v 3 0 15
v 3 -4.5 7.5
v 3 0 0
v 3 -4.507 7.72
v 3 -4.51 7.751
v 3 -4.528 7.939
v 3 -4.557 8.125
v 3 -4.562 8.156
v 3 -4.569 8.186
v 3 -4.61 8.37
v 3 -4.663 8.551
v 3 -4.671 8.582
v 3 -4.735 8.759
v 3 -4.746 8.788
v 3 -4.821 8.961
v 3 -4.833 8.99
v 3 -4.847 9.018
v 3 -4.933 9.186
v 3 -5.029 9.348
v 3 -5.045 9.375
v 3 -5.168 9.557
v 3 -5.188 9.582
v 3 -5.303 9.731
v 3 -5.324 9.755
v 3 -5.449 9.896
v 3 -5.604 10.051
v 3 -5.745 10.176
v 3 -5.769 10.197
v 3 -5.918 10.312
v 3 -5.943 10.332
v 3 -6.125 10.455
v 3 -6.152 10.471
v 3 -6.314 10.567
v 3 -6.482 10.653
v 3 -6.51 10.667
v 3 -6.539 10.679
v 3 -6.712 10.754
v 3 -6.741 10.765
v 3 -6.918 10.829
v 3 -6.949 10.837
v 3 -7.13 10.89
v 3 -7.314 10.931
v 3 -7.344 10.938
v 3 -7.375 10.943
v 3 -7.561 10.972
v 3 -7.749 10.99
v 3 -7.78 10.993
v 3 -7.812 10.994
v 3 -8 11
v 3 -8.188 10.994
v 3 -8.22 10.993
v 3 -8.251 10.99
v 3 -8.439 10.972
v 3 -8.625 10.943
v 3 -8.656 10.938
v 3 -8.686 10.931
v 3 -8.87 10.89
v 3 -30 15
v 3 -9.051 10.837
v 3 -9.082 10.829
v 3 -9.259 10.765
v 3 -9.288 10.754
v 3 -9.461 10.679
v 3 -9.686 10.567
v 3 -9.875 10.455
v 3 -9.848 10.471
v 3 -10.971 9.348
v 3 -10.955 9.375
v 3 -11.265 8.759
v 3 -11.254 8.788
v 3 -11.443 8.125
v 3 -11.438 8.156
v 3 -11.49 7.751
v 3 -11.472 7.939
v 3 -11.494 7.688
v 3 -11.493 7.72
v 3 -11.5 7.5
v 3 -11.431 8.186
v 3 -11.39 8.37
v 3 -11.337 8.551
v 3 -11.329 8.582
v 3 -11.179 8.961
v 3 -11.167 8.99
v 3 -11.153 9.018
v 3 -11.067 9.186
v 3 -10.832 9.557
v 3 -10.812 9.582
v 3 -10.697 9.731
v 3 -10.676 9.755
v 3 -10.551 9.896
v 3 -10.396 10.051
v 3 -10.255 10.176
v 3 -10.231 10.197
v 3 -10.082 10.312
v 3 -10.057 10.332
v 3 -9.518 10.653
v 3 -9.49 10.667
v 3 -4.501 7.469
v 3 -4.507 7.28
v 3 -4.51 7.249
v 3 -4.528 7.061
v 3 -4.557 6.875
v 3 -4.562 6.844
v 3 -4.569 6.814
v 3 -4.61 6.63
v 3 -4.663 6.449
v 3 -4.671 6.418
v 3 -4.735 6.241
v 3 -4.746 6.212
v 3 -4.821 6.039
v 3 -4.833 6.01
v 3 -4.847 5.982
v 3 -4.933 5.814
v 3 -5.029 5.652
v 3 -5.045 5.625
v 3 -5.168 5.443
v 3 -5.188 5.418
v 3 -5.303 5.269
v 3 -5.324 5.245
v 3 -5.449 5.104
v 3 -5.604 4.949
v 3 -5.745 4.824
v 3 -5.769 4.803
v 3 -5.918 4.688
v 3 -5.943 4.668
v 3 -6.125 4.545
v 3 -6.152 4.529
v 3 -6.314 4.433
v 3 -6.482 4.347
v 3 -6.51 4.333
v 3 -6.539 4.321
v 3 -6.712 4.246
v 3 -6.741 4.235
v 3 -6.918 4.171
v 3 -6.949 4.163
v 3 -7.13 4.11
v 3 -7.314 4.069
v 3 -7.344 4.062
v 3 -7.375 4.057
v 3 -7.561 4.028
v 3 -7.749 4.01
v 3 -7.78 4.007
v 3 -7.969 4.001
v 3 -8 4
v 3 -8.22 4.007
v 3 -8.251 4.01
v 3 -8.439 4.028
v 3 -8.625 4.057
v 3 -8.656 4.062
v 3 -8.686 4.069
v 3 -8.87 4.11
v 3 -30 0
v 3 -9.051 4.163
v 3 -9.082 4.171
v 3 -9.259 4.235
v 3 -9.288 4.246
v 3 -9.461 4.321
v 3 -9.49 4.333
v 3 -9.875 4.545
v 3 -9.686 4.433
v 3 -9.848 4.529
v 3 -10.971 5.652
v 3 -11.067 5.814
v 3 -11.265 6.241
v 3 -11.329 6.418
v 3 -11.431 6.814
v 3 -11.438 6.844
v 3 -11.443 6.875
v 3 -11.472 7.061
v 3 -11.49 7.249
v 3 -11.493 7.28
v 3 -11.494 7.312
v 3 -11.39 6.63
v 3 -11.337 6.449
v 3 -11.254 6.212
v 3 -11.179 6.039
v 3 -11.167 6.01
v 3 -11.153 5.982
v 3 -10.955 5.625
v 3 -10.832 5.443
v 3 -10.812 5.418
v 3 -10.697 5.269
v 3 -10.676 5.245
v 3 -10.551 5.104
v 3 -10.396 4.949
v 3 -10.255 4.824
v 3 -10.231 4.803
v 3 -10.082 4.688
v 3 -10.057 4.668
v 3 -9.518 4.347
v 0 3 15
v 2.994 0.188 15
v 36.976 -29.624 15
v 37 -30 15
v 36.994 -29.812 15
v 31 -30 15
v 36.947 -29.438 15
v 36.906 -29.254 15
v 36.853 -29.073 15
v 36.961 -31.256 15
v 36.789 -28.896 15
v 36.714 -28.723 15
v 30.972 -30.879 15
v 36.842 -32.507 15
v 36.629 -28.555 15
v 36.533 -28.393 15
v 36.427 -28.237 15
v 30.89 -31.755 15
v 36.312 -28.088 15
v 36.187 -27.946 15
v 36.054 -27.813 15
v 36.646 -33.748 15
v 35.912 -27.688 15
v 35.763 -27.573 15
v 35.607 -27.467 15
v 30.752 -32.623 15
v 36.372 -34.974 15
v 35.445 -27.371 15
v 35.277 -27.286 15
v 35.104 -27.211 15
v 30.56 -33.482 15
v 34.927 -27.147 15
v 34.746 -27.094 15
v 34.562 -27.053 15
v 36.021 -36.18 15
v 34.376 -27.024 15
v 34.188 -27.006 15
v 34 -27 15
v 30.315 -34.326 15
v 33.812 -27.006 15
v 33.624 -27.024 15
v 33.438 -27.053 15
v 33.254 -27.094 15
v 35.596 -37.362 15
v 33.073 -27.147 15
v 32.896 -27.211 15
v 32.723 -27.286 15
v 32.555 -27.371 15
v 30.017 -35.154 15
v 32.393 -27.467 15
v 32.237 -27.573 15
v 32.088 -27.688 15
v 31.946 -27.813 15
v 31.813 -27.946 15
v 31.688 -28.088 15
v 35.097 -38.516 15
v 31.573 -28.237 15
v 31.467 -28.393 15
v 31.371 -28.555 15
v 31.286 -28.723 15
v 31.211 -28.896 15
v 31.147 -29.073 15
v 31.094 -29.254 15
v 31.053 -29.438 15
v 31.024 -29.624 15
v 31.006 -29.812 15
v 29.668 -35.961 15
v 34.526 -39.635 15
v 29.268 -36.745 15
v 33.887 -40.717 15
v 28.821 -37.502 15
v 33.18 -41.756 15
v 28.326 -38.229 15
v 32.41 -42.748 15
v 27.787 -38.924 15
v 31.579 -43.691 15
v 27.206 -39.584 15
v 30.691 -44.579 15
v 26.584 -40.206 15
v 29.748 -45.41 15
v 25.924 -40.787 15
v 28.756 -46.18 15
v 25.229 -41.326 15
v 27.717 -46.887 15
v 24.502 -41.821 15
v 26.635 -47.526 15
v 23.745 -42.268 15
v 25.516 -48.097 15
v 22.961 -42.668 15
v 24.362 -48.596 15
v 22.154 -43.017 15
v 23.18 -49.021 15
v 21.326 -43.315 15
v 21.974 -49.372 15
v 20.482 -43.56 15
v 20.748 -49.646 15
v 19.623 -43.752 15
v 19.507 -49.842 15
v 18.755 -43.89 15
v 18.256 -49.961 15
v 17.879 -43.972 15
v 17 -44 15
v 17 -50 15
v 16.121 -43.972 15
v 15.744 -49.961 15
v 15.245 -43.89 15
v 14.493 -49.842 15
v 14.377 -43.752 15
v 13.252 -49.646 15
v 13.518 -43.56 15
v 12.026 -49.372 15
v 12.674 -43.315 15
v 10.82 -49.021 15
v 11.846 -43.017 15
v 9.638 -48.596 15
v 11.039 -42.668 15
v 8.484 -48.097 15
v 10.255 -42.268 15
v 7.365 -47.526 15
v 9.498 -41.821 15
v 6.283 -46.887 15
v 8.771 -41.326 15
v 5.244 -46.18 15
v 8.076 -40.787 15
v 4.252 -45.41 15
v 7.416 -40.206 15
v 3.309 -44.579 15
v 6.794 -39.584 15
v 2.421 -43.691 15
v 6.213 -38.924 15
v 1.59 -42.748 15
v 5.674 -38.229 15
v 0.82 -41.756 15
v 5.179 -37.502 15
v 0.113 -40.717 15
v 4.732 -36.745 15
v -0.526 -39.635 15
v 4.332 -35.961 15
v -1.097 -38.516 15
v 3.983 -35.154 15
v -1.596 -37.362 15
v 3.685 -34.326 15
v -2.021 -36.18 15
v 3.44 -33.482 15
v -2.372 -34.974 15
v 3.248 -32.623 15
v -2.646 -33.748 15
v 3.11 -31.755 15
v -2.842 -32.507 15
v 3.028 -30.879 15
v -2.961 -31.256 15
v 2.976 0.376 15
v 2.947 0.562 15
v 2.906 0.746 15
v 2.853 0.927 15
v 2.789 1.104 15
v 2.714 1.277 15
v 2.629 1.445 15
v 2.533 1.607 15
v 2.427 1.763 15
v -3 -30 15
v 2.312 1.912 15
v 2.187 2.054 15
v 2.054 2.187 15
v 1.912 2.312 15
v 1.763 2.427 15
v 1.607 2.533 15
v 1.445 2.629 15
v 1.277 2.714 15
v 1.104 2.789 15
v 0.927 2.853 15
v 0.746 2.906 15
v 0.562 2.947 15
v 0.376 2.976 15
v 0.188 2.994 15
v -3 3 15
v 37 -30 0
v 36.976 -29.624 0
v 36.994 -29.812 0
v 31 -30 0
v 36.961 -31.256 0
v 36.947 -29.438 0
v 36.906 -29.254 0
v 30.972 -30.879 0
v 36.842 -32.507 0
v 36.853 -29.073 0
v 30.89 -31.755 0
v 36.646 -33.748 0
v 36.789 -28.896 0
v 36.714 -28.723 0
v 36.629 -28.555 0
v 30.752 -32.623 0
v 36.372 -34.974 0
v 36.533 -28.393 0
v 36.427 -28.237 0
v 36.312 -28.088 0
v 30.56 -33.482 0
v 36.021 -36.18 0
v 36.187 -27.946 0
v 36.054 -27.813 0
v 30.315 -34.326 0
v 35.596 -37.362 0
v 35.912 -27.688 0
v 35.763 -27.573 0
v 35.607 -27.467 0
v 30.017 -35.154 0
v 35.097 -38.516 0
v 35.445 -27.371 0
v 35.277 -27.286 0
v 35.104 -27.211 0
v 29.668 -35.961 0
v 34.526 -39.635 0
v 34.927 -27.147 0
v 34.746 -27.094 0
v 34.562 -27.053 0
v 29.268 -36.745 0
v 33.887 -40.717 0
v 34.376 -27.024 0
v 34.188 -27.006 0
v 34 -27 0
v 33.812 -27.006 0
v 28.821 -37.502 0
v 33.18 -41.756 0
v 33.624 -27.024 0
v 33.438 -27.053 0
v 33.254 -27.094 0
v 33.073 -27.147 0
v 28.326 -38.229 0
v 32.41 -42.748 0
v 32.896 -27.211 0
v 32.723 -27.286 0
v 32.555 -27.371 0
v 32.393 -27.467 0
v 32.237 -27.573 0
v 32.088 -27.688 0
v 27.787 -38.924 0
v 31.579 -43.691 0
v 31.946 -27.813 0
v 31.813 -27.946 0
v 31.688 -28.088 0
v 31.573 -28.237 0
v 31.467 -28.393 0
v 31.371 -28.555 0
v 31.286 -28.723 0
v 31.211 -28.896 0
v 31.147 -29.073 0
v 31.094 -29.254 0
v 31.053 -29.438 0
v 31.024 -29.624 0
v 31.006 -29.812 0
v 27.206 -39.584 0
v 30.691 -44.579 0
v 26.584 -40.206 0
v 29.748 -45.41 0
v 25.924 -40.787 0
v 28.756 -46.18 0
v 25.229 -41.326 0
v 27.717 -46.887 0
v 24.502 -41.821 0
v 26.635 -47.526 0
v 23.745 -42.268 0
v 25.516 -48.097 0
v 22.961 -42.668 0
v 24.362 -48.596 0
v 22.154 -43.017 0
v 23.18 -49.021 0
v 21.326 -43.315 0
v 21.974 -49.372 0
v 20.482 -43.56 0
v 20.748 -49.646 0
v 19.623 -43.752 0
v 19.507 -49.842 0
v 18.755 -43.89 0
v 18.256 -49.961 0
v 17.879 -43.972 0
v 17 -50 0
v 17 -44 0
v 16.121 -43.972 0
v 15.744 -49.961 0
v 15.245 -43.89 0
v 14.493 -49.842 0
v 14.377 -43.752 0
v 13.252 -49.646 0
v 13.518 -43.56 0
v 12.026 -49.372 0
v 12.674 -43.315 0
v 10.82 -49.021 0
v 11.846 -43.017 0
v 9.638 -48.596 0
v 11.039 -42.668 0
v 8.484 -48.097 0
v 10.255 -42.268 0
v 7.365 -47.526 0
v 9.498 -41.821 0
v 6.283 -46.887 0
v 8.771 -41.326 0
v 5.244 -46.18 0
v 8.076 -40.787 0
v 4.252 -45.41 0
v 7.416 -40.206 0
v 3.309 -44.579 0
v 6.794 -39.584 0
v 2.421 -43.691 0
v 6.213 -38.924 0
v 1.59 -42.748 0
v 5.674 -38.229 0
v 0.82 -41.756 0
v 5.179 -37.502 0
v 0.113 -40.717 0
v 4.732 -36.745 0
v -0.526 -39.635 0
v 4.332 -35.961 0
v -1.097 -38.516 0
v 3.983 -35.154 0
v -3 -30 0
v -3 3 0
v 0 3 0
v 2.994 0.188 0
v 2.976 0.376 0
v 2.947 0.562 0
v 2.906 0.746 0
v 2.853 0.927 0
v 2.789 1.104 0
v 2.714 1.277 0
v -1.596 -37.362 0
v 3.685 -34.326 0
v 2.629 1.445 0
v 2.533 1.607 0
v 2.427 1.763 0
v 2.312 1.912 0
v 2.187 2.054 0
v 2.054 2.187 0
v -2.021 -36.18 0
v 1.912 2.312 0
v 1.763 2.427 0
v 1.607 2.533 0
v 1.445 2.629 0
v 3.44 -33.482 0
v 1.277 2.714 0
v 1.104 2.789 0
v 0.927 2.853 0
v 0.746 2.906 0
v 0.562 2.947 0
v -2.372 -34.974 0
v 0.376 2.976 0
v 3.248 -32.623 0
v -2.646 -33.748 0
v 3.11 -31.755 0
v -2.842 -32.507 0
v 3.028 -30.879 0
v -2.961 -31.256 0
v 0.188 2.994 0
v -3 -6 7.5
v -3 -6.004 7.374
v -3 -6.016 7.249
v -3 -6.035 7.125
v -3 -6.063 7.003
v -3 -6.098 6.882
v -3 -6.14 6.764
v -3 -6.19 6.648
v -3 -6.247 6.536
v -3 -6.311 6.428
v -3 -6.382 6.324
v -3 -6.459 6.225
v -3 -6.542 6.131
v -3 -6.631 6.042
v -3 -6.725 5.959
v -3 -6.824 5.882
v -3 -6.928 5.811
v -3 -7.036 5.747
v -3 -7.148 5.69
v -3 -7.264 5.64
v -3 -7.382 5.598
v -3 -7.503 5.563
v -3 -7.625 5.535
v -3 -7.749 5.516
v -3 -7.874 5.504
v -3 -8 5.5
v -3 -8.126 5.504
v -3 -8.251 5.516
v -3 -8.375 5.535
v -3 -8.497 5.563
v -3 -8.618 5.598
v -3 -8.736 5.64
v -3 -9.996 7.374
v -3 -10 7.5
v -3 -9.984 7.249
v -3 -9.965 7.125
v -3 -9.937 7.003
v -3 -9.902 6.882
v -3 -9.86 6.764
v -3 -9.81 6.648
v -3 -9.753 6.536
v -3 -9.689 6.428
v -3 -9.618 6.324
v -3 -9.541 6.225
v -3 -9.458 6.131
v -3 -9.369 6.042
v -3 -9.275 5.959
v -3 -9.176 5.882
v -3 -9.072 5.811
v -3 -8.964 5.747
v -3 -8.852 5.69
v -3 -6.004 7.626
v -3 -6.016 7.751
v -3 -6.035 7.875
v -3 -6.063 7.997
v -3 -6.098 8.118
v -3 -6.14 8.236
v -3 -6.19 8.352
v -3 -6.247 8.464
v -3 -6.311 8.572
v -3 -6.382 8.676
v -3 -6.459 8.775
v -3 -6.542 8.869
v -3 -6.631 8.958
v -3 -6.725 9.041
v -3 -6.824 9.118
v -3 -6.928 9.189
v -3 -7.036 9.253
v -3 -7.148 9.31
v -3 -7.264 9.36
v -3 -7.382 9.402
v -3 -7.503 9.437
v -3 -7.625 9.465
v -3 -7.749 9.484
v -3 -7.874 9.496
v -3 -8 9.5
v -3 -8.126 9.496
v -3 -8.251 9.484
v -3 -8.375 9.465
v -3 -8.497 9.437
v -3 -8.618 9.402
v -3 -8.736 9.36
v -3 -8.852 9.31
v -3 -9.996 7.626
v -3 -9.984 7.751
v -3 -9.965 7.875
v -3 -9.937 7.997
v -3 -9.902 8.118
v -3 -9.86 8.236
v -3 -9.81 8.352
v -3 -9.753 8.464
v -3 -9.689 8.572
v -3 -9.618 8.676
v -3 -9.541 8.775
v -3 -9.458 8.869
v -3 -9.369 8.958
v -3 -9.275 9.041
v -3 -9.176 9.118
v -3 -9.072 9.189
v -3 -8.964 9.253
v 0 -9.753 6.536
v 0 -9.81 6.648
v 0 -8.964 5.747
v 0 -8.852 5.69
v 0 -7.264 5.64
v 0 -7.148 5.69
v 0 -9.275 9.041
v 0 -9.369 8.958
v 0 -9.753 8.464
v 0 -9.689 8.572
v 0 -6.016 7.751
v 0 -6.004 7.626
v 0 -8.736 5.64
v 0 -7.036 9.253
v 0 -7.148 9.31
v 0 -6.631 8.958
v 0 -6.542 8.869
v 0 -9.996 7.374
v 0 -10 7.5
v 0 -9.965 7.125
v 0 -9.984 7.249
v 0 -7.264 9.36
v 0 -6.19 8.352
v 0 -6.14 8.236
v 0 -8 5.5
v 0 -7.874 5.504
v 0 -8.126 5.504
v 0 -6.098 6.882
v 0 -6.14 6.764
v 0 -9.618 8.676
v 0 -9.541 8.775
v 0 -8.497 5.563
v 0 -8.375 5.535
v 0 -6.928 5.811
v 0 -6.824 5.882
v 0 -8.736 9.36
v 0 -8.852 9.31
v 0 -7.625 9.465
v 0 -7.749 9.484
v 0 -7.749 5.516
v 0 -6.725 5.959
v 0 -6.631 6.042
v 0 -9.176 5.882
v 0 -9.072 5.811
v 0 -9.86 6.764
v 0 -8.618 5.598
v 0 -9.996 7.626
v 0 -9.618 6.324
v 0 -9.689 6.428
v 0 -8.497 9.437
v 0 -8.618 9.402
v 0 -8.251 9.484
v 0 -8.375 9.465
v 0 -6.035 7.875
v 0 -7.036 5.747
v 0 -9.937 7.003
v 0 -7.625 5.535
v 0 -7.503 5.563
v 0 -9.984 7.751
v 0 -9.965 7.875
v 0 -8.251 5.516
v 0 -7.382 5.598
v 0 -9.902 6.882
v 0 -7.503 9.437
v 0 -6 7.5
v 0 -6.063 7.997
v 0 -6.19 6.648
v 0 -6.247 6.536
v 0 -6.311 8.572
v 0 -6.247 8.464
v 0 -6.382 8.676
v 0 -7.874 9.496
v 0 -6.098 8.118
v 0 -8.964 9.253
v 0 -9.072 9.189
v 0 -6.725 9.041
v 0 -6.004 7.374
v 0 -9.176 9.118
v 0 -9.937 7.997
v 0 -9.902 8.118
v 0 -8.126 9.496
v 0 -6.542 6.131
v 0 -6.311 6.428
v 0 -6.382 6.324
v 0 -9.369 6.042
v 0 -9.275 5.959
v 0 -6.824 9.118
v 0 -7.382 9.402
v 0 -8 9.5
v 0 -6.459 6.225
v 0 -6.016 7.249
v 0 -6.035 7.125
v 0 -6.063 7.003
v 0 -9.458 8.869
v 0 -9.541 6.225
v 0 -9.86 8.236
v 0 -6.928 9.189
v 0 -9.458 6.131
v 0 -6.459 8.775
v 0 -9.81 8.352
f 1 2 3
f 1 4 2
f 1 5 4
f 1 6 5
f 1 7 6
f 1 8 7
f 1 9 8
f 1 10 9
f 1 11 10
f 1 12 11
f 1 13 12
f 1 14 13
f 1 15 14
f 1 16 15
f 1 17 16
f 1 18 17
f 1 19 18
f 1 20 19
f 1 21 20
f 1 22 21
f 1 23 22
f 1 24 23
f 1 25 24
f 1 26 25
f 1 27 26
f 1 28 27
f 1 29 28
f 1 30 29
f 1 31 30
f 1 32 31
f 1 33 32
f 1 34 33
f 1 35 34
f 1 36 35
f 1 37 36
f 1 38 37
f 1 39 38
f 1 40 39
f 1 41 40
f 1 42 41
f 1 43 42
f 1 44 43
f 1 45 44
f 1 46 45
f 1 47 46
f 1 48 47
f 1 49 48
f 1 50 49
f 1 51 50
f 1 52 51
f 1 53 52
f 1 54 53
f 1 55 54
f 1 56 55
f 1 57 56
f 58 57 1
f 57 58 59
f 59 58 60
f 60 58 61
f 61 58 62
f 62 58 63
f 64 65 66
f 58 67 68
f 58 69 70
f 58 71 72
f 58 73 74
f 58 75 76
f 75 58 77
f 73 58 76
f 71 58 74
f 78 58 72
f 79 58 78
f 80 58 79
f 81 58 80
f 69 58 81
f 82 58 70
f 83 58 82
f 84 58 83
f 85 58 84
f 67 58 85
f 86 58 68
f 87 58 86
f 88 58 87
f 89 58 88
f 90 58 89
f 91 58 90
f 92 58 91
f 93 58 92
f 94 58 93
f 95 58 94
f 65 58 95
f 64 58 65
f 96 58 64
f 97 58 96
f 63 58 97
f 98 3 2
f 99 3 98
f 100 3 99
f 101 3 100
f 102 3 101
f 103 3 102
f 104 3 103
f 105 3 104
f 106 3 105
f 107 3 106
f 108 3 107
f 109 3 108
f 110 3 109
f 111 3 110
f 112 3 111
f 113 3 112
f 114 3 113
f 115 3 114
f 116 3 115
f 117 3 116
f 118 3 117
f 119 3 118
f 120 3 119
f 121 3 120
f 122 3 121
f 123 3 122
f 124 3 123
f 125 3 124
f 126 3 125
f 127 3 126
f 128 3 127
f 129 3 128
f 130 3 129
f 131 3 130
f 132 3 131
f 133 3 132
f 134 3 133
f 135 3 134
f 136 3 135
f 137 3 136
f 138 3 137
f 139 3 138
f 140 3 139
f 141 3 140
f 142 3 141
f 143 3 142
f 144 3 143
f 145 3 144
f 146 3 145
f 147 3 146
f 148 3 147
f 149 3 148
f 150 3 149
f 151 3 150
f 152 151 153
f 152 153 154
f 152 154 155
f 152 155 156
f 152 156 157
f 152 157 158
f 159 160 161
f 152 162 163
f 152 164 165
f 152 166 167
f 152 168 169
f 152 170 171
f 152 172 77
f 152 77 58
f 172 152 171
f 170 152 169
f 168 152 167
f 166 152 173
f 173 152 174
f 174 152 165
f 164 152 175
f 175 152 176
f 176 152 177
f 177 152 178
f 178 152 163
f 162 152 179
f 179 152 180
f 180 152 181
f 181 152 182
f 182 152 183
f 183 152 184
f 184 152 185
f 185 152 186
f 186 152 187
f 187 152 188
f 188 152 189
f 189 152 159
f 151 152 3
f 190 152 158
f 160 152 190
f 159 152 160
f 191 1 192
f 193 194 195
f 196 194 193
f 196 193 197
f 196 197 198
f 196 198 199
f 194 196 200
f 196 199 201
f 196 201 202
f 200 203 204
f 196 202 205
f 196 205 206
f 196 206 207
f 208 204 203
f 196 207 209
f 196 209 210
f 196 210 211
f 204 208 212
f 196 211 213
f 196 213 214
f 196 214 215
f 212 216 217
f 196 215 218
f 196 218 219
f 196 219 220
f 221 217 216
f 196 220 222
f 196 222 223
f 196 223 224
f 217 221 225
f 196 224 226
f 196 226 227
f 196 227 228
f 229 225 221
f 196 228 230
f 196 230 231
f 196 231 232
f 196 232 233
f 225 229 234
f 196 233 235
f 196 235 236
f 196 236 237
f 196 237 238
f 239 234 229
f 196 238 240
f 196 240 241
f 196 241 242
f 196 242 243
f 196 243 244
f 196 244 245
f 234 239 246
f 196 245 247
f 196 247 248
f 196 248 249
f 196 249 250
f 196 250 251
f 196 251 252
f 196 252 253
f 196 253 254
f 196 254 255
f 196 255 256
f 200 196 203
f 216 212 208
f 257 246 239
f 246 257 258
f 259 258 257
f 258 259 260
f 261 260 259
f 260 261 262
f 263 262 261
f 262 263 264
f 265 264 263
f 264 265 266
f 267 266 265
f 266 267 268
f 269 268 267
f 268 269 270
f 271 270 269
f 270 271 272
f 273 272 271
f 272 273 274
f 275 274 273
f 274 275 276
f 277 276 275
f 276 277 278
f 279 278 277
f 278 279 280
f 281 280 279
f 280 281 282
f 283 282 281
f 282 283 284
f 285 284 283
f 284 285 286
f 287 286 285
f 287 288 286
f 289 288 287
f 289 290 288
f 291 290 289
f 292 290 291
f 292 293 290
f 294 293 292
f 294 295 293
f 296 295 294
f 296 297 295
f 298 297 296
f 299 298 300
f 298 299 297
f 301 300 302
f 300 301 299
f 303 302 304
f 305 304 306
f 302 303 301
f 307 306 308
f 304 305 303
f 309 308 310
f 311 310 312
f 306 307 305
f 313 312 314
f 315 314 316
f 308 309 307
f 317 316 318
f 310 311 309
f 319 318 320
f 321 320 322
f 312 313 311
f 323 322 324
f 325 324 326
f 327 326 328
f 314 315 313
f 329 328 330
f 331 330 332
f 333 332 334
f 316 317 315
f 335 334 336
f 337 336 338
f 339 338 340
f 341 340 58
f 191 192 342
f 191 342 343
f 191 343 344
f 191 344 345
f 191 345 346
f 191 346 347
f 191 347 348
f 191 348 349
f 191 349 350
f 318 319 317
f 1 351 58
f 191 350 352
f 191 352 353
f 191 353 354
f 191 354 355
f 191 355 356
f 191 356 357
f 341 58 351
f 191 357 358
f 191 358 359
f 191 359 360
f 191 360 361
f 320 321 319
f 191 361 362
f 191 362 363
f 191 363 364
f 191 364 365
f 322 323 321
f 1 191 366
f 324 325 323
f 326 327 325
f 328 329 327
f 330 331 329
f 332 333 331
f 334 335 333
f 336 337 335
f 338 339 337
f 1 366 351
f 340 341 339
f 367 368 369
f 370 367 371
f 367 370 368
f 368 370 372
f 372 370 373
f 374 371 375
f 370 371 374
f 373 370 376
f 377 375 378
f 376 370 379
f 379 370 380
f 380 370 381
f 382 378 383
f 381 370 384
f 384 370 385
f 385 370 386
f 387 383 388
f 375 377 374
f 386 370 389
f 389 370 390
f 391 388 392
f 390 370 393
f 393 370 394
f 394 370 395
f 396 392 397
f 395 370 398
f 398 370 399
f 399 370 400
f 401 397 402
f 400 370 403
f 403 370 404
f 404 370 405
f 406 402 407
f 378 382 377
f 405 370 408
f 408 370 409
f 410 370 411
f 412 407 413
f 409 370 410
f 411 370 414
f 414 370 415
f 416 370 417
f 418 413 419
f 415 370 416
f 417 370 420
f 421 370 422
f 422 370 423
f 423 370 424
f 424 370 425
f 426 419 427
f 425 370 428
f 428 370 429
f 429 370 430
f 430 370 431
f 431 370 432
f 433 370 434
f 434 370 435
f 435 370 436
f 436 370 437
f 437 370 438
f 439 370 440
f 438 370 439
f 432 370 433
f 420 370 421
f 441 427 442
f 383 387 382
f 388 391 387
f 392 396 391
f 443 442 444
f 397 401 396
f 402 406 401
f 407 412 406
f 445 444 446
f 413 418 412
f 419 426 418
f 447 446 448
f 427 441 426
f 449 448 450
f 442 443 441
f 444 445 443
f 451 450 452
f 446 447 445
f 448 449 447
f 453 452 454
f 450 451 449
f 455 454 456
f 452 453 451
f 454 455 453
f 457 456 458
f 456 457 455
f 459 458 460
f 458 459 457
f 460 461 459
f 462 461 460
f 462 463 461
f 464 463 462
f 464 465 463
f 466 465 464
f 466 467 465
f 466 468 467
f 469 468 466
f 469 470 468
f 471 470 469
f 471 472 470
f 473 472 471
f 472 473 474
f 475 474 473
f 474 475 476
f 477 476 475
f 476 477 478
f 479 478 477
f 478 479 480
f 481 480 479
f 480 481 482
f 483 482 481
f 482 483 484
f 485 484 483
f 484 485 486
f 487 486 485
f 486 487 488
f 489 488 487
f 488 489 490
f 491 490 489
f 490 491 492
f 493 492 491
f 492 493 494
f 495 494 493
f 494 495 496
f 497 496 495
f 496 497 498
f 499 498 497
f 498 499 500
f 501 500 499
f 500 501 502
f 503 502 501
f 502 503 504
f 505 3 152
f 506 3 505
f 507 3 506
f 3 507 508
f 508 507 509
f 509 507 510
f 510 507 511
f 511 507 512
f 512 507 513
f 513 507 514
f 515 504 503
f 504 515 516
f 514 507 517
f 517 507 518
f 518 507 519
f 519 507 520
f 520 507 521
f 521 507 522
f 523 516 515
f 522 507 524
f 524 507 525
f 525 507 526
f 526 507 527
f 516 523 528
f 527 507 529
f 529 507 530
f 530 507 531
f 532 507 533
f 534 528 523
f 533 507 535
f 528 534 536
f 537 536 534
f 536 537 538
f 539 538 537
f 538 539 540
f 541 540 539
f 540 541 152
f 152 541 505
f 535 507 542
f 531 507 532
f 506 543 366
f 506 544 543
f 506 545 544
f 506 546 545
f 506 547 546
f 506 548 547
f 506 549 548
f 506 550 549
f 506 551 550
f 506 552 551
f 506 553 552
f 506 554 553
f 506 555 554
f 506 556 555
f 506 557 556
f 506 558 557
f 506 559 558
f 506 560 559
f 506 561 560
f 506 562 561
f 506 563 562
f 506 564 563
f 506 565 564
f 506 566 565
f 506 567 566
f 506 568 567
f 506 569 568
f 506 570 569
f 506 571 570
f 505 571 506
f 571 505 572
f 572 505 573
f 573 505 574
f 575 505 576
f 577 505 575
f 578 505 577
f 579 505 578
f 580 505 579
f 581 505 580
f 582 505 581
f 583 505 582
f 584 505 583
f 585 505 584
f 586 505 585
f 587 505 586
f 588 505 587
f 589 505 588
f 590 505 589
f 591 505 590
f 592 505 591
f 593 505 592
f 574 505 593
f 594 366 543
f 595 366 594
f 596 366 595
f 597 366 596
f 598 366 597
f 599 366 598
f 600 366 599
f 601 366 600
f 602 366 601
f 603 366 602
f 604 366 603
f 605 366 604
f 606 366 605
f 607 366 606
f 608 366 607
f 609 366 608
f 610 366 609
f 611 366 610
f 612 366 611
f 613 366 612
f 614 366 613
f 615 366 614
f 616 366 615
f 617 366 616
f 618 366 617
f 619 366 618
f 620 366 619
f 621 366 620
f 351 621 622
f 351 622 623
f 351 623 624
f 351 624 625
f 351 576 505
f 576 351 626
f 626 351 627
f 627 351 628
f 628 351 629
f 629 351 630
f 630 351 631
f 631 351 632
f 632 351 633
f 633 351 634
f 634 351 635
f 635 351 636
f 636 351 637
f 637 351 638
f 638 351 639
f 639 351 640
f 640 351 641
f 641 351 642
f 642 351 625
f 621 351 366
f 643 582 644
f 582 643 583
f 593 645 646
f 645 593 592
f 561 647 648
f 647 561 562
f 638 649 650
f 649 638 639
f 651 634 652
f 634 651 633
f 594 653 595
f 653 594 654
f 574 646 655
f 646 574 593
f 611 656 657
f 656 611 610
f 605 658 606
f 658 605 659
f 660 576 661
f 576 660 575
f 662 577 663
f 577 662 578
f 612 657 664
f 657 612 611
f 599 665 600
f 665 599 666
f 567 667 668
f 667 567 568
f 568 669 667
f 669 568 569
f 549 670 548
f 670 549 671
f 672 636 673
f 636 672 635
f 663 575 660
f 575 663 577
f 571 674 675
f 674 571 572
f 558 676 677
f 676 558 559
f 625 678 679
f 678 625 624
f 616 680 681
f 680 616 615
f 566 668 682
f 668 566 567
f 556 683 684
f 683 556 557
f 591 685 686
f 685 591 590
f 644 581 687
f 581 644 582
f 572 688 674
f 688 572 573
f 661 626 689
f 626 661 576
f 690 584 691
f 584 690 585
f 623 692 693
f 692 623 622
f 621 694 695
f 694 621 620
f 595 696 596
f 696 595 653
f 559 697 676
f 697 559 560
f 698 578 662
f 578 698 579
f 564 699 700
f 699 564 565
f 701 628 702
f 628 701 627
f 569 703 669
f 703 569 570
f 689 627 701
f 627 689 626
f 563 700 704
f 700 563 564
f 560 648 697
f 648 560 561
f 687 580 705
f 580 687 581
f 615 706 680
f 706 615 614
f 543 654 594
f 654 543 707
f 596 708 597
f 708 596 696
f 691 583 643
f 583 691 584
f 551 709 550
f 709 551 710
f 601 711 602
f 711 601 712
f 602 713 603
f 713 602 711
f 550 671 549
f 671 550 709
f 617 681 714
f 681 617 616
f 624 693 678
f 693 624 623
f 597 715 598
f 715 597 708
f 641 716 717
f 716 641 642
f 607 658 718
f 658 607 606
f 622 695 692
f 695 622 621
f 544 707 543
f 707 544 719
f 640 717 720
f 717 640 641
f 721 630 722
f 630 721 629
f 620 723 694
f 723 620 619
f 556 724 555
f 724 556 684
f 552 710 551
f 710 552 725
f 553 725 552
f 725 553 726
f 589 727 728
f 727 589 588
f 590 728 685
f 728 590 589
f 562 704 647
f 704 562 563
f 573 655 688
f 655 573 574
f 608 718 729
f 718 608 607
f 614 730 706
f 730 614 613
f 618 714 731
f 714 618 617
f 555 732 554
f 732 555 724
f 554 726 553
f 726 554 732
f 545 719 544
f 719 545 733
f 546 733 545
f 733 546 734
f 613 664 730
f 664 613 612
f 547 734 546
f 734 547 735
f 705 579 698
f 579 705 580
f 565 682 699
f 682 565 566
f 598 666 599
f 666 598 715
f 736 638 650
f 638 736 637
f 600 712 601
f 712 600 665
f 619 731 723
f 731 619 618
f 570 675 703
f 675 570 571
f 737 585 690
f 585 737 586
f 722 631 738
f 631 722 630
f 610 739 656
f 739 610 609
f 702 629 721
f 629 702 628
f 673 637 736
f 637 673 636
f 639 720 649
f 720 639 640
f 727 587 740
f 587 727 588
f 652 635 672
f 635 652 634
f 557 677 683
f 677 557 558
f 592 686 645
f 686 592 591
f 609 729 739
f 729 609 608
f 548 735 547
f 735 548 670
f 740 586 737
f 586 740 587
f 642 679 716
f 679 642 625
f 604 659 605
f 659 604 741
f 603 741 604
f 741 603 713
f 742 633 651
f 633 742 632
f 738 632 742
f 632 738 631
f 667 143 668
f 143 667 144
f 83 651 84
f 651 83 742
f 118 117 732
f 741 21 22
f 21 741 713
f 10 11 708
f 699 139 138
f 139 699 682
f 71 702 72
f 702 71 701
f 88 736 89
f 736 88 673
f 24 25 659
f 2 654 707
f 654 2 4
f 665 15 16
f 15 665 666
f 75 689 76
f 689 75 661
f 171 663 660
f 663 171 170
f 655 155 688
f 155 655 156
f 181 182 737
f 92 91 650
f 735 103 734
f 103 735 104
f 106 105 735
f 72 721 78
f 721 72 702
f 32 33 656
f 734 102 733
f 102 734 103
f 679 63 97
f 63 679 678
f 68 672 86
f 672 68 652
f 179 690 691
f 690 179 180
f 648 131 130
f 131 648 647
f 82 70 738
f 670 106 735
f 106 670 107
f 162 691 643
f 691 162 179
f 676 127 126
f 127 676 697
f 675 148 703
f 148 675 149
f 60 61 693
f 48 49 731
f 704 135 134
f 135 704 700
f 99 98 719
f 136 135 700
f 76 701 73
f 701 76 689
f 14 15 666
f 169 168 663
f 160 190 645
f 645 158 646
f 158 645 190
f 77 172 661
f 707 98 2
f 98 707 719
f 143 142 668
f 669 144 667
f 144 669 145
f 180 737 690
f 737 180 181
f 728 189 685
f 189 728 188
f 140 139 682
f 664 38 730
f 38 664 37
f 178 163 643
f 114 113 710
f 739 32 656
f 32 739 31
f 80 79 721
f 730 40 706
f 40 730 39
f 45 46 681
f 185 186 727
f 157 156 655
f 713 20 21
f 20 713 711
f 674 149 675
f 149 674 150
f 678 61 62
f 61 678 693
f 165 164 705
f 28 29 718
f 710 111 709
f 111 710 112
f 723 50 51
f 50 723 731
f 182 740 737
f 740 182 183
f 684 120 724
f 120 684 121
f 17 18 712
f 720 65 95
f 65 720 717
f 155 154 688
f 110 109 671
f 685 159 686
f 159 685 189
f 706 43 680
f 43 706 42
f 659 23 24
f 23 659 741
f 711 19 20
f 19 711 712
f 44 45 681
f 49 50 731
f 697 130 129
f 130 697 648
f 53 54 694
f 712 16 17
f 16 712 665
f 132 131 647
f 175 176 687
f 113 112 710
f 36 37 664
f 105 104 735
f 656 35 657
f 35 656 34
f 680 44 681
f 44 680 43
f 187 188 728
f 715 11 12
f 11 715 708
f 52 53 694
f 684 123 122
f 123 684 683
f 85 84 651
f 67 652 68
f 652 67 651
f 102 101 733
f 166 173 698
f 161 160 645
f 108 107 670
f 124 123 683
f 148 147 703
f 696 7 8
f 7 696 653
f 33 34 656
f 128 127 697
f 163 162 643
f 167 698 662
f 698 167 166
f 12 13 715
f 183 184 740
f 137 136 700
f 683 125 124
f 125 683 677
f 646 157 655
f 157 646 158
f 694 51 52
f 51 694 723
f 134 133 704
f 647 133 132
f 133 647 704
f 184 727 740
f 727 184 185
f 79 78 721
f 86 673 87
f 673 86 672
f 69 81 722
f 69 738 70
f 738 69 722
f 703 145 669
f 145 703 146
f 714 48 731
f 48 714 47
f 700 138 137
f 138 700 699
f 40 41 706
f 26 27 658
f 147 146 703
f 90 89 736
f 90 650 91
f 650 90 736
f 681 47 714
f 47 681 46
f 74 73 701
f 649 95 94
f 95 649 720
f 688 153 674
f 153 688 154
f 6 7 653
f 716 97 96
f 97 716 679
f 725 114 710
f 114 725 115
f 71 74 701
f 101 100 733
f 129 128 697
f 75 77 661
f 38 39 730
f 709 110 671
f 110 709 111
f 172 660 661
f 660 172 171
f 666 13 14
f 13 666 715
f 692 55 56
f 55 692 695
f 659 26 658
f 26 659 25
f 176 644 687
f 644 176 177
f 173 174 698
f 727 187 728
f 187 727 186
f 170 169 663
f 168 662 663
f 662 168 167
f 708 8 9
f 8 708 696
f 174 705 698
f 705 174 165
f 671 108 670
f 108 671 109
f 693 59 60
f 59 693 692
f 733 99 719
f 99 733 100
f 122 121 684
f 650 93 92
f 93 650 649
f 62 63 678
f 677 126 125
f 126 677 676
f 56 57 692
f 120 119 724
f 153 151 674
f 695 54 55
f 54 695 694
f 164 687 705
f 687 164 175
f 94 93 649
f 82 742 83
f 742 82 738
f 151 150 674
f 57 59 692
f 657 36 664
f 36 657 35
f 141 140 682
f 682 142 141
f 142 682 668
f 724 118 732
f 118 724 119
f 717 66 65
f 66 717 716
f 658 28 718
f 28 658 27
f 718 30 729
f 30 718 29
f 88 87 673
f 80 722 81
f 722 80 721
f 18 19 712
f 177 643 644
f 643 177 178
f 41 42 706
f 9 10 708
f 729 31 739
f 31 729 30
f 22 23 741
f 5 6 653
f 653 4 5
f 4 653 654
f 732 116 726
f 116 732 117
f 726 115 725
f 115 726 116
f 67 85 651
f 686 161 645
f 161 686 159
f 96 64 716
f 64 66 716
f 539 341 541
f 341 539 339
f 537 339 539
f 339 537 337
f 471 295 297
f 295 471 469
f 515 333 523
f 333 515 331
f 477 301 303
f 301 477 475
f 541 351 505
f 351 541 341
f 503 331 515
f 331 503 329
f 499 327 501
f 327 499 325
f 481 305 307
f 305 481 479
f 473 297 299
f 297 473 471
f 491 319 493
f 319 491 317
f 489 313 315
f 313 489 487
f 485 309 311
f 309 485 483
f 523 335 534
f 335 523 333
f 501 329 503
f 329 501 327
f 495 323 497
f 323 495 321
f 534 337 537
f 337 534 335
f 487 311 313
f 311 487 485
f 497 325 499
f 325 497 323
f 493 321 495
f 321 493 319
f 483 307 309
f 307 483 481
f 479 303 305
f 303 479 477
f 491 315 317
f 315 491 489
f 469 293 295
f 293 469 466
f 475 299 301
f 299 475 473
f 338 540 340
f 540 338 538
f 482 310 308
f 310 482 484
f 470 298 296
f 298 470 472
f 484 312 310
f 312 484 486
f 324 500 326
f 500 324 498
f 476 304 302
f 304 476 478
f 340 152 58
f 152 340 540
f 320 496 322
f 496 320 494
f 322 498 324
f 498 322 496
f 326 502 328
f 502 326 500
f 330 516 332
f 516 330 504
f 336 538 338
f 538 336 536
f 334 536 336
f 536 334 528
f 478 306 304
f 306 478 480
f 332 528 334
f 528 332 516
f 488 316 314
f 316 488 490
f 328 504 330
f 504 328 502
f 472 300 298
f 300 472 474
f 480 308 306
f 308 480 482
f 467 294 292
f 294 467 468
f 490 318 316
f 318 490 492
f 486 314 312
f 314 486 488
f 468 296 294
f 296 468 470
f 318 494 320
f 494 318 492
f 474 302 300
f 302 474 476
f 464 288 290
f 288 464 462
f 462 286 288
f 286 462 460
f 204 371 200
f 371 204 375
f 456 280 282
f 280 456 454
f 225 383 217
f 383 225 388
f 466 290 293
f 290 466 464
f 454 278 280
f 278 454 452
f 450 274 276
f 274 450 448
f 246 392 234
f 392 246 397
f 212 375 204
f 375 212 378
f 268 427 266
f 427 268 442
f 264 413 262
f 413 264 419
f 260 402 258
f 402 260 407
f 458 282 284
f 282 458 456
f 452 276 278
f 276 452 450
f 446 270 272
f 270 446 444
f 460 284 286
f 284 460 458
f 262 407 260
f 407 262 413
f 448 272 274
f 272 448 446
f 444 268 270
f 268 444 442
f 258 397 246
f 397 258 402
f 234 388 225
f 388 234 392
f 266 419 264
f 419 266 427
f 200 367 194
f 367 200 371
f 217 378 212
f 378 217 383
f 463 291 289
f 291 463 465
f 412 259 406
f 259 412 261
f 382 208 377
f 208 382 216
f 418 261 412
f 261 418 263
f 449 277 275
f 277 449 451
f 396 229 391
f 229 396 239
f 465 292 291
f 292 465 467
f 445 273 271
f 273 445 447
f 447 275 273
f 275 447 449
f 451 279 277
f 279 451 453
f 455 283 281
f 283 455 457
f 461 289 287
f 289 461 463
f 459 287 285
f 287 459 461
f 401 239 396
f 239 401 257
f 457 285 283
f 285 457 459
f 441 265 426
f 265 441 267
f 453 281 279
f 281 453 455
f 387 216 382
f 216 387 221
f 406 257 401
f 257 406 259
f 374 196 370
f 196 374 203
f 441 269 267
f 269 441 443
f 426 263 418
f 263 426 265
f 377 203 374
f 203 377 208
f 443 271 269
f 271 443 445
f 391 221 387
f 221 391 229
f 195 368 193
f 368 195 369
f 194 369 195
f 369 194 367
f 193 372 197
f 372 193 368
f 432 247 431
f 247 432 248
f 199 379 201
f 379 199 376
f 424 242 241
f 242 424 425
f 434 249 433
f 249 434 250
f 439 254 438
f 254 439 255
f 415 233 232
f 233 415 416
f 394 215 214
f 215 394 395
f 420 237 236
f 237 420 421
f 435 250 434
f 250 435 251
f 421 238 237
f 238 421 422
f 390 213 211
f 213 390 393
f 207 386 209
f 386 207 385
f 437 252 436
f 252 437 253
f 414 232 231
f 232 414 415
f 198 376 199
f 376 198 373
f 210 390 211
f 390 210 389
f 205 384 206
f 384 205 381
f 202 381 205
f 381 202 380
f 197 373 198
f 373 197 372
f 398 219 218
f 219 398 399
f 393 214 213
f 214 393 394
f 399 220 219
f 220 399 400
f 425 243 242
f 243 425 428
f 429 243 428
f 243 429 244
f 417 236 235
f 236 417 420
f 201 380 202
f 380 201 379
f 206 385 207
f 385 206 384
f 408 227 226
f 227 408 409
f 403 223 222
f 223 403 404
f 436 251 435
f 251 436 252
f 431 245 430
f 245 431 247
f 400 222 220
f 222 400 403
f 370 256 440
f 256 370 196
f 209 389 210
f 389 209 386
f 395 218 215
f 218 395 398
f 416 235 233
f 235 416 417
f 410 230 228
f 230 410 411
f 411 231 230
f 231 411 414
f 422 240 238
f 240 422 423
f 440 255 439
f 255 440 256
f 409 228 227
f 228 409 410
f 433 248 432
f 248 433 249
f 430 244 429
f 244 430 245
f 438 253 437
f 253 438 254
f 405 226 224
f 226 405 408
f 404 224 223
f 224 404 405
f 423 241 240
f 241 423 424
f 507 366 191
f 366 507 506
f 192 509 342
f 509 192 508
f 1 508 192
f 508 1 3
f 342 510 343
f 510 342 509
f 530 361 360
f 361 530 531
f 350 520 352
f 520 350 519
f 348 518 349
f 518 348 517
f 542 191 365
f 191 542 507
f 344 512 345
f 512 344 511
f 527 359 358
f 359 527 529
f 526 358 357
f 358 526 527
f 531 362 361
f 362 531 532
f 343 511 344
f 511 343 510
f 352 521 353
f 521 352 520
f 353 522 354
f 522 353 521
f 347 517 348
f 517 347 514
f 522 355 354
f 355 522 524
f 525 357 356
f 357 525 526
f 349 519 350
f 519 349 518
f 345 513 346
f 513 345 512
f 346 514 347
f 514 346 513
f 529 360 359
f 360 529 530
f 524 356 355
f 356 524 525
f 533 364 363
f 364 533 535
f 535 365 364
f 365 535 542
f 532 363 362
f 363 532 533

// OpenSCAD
// file: lib.scad
module round1_4(radius, width, height) {
  translate([0,radius-width/2,0])
  rotate([0, 0, -90])
  intersection() {
    difference() {
      cylinder(r=radius, h=height, center=false);
      translate([0,0,-1])cylinder(r=radius-width, h=height+2, center=false);
    }
    cube(size=radius*2);
  }
}

module round1_8(radius, width) {
  difference() {
  round1_4(radius, width);
  translate([0, radius, -1]) rotate([0, 0, -45]) cube([radius, radius, width + 2]);
  }
}

module flat_hanger(hookRadius, width, h, gape) {
  translate([width/2, 0, 0])
    rotate([0, 0, -90]) round1_4(hookRadius, width, h);

  translate([hookRadius, -hookRadius, 0])
    cube([gape, width, h], center=false);

  translate([hookRadius+gape, width/2-hookRadius, 0])
    rotate([0, 0, 0]) round1_4(hookRadius, width, h);

  translate([2*hookRadius+gape-width/2, 0, 0])
    cylinder(d=width, h=h, center=false);

}

module round_hanger(hookRadius, width, h) {
  translate([width/2, 0, 0])
    rotate([0, 0, -90]) round1_4(hookRadius, width, h);

  translate([hookRadius, width/2-hookRadius, 0])
    rotate([0, 0, 0]) round1_4(hookRadius, width, h);

  translate([2*hookRadius-width/2, 0, 0])
    cylinder(d=width, h=h, center=false);

  /* difference() { */
  /*   difference() { */
  /*     translate([(hookRadius-width/2),0,0]) cylinder(r=hookRadius, h=h); */
  /*     translate([(hookRadius-width/2),0,0]) cylinder(r=hookRadius-width, h=2*h+2, center=true); */
  /*   } */

  /*   translate([0, 0, -1]) cube([2*hookRadius, hookRadius+2, h+2], center=false); */
  /* } */


  /* translate([2*hookRadius-width, 0, 0]) */
  /*   cylinder(d=width, h=h, center=false); */
}
// main file
use <lib.scad>;

$fn=100;
h=15;
width=6;

module basic_hook(backHeight, gape, hookRadius, width, h){
  translate([-width/4, 0, h/2]) cube([width/2, width, h], center=true);
  cylinder(d=width, h=h);

  // frontside of the top
  difference() {
    translate([0, -backHeight/2, h/2]) cube([width,backHeight,h], center=true);
    translate([0, -8, h/2])rotate([0,90,0]) cylinder(d=4, h=10, center=true);
    translate([0, -8, h/2]) rotate([0, 90, 0]) cylinder(d1=4, d2=8, h=4, center=false);
}


  translate([-width/2, -backHeight, 0])
    round_hanger(hookRadius, width, h);
}


gape=25;
top=30;
hookRadius = 20;

// 1.0
basic_hook(30, 25, 20, 6, 15);
